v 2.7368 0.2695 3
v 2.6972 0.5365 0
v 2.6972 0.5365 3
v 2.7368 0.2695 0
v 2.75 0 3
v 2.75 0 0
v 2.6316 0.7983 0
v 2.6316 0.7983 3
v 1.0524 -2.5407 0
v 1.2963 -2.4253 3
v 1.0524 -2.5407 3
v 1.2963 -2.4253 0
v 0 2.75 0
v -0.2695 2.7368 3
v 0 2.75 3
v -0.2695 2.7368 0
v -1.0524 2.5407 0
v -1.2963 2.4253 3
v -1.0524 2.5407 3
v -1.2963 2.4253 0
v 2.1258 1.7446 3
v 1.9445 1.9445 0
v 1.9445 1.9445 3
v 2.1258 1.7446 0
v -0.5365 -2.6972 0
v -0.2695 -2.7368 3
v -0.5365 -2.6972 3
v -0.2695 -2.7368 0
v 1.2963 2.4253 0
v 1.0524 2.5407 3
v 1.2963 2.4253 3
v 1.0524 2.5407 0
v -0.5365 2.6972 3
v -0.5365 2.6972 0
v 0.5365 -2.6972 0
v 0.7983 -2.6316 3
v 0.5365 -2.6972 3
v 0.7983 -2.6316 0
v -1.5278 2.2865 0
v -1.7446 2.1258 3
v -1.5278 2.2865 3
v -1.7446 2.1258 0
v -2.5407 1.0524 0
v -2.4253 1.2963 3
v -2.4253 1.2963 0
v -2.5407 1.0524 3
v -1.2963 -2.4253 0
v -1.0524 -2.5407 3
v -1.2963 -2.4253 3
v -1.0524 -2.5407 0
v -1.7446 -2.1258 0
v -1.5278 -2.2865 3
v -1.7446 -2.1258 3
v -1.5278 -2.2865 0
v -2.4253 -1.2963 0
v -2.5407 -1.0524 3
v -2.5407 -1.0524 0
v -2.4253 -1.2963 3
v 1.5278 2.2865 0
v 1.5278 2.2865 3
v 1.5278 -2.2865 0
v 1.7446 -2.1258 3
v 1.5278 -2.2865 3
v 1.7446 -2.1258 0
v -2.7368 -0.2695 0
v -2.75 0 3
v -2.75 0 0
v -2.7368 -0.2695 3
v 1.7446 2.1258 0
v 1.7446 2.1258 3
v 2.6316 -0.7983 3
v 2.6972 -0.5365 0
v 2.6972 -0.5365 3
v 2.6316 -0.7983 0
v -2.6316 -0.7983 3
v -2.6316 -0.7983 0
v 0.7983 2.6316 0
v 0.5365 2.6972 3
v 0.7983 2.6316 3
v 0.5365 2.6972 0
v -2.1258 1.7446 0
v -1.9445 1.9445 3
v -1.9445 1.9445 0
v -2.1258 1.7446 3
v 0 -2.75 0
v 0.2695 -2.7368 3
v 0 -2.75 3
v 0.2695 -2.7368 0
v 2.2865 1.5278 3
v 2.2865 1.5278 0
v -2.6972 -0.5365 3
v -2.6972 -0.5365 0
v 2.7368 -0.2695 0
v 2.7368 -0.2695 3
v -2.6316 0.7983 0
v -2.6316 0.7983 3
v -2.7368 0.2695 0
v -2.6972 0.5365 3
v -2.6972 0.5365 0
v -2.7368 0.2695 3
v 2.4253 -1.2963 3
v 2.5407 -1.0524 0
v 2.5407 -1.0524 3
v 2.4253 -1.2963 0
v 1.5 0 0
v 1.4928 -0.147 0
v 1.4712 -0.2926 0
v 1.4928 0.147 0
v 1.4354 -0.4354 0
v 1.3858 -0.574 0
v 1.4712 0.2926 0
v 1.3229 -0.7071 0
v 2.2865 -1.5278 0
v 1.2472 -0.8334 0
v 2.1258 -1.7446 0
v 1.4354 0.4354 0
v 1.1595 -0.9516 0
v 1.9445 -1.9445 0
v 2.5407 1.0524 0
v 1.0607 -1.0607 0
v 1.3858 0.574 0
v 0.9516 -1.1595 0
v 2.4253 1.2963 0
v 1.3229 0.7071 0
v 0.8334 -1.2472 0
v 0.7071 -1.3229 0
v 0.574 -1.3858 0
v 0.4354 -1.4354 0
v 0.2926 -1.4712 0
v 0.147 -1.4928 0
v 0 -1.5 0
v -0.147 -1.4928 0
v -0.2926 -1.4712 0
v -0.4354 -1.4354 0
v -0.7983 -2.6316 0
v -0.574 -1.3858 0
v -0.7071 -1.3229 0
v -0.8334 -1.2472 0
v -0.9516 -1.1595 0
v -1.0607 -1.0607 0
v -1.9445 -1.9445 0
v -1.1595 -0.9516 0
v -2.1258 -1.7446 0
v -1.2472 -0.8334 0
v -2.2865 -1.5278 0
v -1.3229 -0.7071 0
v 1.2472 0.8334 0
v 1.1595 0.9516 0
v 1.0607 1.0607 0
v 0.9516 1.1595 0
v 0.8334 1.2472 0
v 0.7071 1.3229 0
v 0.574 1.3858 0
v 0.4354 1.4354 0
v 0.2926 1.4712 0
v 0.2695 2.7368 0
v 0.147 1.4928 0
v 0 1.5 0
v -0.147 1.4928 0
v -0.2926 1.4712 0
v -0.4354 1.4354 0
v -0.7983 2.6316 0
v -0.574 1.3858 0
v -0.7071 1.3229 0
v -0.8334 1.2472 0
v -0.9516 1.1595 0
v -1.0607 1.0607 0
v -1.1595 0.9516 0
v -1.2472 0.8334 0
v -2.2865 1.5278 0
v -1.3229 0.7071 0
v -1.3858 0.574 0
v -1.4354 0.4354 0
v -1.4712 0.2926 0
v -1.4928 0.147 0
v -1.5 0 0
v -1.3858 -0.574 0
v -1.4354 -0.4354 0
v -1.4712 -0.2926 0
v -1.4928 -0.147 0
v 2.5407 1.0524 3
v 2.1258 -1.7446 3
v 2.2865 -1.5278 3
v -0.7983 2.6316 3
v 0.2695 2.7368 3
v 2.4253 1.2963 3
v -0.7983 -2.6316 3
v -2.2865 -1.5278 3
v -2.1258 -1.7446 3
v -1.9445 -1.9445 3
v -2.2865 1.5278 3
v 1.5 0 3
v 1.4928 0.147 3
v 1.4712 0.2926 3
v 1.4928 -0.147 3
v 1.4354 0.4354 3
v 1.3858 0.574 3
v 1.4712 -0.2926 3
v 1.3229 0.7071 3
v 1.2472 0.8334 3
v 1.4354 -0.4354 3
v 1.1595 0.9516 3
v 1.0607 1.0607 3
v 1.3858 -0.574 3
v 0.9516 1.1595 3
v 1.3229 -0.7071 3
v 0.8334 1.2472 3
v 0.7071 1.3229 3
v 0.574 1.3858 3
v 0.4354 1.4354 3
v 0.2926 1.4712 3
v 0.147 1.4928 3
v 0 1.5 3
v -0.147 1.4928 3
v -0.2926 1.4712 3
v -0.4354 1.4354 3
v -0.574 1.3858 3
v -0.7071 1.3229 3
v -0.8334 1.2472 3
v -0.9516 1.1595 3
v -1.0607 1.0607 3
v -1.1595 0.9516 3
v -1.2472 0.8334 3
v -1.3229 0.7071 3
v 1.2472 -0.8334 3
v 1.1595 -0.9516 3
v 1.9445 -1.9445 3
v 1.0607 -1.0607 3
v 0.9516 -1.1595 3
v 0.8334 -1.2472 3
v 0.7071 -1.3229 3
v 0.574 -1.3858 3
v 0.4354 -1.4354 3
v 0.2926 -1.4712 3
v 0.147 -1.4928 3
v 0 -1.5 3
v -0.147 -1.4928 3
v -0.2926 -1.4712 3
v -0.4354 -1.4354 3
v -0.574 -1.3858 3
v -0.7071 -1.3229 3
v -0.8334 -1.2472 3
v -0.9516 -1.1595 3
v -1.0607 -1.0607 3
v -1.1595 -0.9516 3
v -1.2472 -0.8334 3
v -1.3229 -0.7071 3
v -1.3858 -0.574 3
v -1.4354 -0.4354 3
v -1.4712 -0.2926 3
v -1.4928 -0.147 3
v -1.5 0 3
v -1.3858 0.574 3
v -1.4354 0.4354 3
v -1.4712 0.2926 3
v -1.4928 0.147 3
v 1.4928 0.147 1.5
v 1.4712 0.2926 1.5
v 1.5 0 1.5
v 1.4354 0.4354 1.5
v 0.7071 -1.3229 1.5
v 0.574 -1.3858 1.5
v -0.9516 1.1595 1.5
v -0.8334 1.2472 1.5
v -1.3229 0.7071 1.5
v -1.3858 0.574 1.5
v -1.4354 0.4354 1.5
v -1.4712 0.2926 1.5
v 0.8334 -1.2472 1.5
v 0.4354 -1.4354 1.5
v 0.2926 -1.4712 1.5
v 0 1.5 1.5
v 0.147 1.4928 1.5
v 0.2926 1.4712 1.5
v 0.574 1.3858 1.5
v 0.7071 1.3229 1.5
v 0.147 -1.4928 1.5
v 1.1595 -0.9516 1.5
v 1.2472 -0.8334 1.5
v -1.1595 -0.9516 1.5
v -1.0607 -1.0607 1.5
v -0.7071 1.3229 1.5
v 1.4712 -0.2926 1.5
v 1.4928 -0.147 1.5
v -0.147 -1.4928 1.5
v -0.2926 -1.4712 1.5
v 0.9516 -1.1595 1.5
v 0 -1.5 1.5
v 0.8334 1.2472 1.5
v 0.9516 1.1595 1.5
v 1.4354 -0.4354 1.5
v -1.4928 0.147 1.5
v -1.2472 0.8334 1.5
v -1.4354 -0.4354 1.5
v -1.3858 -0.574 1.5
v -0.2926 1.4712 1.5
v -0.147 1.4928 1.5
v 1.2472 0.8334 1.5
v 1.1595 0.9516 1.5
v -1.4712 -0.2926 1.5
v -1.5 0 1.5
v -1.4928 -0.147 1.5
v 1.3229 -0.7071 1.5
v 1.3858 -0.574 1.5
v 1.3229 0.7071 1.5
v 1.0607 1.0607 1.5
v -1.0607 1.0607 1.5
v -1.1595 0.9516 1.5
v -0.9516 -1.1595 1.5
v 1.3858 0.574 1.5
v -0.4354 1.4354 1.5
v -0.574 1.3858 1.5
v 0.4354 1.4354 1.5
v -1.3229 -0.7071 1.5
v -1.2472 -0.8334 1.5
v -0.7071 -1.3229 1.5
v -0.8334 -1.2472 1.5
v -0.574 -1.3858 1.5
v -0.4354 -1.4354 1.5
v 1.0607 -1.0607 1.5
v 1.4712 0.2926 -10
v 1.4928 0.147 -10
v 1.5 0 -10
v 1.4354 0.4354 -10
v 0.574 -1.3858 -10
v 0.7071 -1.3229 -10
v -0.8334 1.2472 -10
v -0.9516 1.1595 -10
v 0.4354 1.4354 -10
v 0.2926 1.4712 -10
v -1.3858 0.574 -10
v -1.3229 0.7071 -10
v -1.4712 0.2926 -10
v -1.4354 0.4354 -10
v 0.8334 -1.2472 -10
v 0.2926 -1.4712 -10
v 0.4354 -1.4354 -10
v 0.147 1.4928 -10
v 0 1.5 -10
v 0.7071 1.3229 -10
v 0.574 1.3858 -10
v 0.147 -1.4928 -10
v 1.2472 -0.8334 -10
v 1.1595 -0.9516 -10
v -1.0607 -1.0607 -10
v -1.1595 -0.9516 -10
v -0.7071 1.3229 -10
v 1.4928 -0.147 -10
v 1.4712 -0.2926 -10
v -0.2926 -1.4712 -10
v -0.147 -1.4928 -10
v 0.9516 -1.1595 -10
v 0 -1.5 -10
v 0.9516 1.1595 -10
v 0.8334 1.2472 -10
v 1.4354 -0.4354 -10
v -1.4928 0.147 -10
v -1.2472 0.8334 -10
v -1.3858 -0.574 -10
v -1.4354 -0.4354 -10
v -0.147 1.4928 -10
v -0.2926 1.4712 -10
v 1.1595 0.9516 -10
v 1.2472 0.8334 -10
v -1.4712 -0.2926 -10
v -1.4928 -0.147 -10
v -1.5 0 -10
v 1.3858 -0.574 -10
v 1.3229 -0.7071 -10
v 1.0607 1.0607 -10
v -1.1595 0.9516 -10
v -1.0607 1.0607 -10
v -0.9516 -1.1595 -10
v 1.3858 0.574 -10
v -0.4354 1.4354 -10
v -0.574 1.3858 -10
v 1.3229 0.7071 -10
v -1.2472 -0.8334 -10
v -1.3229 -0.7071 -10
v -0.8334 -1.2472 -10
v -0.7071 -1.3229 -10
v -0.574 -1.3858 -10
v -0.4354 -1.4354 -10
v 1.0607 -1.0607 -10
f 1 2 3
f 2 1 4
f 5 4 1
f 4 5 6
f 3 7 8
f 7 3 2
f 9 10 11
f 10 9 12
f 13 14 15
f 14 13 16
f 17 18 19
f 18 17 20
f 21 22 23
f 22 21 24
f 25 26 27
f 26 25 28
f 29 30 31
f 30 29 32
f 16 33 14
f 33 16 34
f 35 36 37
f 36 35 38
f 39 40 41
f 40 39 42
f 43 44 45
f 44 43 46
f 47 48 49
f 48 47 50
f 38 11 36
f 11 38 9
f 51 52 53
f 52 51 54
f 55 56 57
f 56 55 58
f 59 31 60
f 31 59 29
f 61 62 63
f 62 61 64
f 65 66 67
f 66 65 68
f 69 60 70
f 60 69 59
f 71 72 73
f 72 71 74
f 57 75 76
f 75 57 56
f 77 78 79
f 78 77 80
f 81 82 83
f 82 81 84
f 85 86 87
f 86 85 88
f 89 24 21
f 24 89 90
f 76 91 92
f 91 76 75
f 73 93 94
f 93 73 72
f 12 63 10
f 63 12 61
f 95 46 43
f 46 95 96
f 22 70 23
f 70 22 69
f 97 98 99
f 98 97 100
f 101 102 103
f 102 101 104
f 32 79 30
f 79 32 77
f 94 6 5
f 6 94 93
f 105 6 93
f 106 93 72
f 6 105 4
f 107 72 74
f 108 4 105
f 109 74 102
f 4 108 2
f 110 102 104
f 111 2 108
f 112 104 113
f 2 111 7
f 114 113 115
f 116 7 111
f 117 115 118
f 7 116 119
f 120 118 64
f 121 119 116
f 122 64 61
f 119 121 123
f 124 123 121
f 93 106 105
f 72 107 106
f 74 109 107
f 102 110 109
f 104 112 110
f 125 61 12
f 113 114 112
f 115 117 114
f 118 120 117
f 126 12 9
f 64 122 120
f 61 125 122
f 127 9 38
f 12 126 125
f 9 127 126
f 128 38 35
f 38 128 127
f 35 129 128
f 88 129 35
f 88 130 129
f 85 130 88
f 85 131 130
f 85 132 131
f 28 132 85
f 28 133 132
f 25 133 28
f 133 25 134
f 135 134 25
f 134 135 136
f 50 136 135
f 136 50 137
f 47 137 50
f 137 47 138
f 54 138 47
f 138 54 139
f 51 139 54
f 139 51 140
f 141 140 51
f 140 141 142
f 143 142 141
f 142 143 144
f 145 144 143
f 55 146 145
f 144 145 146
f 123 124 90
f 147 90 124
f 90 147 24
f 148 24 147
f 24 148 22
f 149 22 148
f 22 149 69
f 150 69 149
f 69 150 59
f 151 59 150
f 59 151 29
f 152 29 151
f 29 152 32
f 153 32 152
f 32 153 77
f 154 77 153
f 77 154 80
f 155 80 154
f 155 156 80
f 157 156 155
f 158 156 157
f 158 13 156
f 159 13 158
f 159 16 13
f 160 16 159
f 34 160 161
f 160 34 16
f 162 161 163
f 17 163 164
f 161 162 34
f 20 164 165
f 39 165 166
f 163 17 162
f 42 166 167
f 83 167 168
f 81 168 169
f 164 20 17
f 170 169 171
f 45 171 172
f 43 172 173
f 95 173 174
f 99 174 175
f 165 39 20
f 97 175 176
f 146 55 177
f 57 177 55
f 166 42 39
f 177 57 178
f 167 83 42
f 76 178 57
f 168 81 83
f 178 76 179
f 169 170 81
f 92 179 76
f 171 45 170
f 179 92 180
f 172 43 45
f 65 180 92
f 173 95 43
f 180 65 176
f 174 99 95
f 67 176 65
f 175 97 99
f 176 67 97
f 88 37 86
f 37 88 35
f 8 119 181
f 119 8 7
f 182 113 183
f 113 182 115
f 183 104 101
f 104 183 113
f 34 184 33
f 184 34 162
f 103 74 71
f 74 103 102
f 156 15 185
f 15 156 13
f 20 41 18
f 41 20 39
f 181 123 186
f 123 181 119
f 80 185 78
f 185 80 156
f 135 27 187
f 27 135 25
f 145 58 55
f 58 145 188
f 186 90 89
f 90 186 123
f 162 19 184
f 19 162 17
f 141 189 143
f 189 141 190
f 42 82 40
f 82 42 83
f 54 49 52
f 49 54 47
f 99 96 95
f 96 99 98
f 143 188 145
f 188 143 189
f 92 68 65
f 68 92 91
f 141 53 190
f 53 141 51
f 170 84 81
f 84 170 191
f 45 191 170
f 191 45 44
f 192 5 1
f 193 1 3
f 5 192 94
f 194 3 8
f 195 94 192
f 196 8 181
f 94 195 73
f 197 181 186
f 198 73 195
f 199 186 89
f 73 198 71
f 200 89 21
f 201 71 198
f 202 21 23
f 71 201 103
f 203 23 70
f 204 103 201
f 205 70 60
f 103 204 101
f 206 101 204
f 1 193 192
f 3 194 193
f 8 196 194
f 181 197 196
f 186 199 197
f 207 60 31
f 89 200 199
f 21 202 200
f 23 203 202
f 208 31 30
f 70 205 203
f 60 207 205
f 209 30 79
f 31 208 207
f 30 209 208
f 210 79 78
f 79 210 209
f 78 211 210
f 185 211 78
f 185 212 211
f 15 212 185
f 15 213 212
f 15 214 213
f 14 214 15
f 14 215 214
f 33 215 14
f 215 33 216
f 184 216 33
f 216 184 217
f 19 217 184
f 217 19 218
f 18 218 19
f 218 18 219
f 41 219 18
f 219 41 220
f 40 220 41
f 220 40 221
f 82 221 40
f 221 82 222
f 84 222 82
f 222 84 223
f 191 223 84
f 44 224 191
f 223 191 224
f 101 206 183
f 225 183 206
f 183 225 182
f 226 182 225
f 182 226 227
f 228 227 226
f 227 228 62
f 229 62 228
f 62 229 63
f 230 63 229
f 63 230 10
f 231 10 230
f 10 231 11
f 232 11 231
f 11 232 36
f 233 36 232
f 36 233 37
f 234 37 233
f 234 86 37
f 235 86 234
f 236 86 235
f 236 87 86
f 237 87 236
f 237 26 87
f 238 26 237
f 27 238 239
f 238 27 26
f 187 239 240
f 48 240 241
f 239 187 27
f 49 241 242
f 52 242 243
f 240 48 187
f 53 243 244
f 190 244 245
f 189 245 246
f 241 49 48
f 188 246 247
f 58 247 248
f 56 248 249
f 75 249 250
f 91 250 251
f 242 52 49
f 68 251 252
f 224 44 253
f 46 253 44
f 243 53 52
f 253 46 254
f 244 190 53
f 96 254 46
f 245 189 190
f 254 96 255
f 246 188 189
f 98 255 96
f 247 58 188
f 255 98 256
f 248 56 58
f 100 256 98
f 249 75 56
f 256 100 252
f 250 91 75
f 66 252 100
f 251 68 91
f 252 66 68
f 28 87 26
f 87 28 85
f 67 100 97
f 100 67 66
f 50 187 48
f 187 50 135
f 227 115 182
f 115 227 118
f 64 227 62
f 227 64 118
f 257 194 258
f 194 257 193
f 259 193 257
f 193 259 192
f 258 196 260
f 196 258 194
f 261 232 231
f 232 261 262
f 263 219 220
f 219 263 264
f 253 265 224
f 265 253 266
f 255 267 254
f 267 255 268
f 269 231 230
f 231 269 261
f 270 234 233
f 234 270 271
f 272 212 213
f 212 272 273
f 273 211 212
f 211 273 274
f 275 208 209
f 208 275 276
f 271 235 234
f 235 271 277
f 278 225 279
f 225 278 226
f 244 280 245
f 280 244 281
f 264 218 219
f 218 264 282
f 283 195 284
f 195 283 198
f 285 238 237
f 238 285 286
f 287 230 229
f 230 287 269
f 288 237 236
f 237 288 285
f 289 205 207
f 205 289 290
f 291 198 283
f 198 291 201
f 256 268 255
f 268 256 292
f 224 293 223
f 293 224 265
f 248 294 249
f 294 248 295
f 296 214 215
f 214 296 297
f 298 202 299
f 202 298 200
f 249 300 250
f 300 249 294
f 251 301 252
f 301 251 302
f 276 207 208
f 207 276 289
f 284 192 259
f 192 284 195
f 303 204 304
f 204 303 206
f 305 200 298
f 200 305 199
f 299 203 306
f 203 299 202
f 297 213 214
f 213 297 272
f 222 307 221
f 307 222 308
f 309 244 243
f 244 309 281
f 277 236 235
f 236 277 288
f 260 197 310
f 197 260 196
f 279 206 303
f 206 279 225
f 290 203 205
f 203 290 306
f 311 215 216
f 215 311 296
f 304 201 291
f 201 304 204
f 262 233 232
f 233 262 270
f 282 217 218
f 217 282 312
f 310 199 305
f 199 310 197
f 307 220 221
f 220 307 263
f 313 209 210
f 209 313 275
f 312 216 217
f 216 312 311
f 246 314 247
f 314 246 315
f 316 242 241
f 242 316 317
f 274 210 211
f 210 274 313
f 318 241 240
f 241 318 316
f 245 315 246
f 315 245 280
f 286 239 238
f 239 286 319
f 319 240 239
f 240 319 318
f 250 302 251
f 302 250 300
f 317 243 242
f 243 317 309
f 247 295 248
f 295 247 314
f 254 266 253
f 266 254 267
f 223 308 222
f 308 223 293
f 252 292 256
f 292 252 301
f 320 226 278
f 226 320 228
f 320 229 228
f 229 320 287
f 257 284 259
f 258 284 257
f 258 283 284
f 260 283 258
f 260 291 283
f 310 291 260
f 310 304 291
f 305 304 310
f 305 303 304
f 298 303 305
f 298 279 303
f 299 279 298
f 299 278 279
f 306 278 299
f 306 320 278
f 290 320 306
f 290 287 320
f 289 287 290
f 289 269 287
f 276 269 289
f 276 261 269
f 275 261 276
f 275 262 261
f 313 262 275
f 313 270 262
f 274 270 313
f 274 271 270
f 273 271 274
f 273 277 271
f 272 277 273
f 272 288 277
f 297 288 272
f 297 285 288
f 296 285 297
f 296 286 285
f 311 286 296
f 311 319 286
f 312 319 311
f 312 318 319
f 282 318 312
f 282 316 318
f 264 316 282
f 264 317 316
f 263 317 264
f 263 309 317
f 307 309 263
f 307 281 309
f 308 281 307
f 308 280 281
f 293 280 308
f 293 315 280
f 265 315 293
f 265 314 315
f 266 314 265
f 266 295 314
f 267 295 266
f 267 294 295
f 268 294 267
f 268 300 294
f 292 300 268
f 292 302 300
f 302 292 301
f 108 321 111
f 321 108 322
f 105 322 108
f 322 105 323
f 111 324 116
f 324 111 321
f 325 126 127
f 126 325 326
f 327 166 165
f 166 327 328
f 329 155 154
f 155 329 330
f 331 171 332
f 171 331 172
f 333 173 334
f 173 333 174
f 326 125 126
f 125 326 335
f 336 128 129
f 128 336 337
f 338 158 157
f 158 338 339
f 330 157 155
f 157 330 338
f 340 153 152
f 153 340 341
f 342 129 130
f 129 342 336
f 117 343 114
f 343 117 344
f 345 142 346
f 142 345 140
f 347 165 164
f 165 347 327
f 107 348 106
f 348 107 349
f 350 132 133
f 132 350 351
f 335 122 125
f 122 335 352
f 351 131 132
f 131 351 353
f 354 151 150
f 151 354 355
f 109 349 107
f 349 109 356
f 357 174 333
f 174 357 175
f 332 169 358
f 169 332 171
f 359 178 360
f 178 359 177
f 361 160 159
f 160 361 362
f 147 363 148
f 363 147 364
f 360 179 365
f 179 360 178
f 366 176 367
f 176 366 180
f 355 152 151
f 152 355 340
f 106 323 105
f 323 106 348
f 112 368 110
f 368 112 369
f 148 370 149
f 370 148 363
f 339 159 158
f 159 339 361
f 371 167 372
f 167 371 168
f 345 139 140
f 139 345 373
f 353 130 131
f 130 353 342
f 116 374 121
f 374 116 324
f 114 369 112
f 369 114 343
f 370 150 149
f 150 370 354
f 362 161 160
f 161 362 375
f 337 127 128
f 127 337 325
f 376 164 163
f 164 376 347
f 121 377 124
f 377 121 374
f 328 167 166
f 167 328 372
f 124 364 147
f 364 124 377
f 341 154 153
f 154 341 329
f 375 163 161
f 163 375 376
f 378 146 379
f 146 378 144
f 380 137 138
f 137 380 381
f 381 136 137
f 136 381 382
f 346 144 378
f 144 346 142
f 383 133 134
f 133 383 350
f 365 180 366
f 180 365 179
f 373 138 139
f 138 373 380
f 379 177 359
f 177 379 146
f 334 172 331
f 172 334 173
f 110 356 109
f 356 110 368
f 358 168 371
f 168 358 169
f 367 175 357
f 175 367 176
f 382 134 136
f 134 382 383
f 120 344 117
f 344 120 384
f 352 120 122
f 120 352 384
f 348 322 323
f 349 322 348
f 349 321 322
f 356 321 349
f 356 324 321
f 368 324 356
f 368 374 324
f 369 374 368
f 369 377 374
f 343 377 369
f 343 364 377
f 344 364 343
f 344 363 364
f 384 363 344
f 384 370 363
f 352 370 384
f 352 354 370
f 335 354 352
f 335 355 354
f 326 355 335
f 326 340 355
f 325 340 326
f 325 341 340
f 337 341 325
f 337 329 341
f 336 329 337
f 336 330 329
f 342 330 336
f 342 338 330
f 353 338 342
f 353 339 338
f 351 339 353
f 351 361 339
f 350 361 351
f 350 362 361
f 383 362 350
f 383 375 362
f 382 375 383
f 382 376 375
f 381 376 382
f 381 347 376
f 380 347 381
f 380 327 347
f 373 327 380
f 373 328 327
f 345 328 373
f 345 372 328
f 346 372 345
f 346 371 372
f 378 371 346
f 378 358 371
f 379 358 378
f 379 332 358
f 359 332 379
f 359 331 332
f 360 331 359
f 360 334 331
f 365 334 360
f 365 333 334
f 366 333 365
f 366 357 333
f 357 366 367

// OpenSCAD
module socket_head_cap_screw() {
    // Head of the screw
    difference() {
        cylinder(h = 3.0, d = 5.5, $fn = 64);
        translate([0, 0, 1.5])
            cylinder(h = 3.0, d = 3.0, $fn = 64);
    }
    
    // Shaft of the screw
    translate([0, 0, -10])
        cylinder(h = 10, d = 3.0, $fn = 64);
}

socket_head_cap_screw();
